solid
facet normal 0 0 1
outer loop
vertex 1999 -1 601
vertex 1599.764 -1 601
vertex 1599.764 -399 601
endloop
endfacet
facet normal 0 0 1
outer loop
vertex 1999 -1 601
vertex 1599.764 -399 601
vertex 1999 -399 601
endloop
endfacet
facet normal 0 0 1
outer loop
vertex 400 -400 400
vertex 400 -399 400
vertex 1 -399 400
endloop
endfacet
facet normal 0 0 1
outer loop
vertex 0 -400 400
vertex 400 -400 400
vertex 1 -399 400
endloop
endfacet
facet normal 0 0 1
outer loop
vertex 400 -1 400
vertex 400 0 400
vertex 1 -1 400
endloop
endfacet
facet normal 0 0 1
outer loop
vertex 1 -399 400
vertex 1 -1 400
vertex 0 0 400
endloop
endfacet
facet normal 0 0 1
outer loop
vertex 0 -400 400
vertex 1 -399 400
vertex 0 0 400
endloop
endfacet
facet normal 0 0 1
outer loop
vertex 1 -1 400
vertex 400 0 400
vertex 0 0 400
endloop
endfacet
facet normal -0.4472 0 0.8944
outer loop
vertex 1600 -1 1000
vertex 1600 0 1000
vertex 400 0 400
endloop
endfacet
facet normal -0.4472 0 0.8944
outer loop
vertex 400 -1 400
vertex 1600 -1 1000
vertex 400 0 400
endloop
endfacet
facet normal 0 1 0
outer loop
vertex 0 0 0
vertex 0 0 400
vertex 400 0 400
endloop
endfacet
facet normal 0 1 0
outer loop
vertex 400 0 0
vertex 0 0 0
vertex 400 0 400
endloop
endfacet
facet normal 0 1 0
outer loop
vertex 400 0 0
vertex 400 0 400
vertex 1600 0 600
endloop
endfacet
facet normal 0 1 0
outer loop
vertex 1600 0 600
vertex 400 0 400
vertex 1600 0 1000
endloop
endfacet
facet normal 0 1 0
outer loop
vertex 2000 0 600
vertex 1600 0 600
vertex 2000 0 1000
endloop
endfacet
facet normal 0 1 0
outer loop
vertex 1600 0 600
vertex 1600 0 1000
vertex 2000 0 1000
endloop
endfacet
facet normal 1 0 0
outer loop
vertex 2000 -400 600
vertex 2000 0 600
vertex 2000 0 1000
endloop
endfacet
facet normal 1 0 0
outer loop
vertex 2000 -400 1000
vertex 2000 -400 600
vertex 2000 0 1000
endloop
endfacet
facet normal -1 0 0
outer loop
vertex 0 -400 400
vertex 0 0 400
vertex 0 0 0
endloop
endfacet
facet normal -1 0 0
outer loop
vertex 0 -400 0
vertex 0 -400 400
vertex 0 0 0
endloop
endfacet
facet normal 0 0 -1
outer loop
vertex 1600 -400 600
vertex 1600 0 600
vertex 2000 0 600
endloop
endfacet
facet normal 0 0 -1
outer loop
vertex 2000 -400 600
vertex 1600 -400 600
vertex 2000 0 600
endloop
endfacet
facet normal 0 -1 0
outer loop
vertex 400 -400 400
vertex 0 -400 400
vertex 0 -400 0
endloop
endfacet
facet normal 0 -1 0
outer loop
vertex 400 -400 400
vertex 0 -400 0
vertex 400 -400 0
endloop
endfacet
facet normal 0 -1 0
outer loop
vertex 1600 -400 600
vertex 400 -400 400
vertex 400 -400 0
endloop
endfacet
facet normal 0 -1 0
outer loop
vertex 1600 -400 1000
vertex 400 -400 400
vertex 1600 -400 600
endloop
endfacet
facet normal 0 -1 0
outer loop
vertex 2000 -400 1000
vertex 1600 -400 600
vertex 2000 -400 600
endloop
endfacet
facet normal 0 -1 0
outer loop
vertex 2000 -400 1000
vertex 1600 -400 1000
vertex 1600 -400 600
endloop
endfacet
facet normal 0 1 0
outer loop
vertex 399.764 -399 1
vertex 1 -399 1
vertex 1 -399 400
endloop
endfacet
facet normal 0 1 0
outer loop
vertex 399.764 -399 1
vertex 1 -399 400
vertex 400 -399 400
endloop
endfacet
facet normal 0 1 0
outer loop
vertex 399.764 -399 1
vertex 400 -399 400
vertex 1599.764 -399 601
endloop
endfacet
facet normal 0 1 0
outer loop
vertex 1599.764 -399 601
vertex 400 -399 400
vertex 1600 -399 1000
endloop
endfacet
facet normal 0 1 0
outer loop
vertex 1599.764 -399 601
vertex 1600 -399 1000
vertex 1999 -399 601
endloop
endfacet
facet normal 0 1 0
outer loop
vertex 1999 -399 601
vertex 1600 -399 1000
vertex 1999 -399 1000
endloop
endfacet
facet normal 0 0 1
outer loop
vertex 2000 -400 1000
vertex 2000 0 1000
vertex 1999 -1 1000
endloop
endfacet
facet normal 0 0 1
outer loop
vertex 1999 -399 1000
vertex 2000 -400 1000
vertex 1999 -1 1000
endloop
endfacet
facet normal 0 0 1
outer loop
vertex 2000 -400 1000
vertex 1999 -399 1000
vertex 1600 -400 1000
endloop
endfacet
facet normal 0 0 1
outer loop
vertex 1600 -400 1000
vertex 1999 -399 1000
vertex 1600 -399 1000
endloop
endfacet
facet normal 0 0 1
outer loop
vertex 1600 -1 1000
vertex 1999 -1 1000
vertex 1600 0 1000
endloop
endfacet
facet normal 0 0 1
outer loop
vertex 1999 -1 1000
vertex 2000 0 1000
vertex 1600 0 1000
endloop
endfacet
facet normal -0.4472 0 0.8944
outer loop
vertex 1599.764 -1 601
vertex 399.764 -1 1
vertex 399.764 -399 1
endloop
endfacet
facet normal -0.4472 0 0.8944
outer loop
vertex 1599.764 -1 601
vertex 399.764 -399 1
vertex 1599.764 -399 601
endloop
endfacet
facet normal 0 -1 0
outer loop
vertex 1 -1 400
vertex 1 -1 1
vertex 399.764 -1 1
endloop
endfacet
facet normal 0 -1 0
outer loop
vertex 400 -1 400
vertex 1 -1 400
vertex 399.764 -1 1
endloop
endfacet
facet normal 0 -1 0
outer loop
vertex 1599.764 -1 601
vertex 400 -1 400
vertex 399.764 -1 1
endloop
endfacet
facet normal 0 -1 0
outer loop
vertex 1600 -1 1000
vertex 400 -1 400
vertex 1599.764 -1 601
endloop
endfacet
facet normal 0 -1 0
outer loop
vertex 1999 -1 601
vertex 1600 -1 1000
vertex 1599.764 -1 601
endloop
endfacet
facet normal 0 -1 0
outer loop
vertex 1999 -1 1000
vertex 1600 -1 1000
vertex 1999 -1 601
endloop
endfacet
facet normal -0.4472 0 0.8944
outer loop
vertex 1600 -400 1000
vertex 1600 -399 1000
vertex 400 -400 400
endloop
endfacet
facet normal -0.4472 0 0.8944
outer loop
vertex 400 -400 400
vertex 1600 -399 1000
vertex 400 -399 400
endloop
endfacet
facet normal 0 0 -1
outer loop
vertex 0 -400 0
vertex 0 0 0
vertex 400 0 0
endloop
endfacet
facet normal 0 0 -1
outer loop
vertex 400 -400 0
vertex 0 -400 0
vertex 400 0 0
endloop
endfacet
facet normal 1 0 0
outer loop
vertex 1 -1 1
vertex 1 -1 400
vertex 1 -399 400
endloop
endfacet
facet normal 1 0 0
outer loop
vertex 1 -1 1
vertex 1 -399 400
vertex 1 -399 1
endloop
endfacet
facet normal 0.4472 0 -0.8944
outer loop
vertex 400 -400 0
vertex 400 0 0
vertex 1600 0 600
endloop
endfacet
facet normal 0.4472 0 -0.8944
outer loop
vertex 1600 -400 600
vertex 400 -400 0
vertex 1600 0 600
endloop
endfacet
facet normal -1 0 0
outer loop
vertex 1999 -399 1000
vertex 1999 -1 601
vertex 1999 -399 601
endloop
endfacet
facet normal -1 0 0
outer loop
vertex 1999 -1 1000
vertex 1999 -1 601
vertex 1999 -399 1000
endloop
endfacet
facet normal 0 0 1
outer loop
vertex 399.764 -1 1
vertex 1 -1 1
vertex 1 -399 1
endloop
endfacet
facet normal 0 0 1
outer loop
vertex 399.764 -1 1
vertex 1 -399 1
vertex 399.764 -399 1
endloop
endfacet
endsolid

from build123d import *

# Parameters (mm, degrees)
F1_DEPTH = 400
F2_T     = -1


with BuildPart() as f1:
    # F0 (on Front) → F1 (new body)
    with BuildSketch(Plane.XZ):
        Polygon((0, 400), (0, 0), (400, 0), (1600, 600), (2000, 600), (2000, 1000), (1600, 1000), (400, 400), align=None)
    extrude(amount=F1_DEPTH)

    # F2
    f2_openings = [f1.faces().sort_by_distance(p)[0] for p in [
        (200, -200, 400),
        (1000, -200, 700),
        (1800, -200, 1000),
    ]]
    offset(amount=F2_T, openings=f2_openings, kind=Kind.INTERSECTION)


solid = f1.part
